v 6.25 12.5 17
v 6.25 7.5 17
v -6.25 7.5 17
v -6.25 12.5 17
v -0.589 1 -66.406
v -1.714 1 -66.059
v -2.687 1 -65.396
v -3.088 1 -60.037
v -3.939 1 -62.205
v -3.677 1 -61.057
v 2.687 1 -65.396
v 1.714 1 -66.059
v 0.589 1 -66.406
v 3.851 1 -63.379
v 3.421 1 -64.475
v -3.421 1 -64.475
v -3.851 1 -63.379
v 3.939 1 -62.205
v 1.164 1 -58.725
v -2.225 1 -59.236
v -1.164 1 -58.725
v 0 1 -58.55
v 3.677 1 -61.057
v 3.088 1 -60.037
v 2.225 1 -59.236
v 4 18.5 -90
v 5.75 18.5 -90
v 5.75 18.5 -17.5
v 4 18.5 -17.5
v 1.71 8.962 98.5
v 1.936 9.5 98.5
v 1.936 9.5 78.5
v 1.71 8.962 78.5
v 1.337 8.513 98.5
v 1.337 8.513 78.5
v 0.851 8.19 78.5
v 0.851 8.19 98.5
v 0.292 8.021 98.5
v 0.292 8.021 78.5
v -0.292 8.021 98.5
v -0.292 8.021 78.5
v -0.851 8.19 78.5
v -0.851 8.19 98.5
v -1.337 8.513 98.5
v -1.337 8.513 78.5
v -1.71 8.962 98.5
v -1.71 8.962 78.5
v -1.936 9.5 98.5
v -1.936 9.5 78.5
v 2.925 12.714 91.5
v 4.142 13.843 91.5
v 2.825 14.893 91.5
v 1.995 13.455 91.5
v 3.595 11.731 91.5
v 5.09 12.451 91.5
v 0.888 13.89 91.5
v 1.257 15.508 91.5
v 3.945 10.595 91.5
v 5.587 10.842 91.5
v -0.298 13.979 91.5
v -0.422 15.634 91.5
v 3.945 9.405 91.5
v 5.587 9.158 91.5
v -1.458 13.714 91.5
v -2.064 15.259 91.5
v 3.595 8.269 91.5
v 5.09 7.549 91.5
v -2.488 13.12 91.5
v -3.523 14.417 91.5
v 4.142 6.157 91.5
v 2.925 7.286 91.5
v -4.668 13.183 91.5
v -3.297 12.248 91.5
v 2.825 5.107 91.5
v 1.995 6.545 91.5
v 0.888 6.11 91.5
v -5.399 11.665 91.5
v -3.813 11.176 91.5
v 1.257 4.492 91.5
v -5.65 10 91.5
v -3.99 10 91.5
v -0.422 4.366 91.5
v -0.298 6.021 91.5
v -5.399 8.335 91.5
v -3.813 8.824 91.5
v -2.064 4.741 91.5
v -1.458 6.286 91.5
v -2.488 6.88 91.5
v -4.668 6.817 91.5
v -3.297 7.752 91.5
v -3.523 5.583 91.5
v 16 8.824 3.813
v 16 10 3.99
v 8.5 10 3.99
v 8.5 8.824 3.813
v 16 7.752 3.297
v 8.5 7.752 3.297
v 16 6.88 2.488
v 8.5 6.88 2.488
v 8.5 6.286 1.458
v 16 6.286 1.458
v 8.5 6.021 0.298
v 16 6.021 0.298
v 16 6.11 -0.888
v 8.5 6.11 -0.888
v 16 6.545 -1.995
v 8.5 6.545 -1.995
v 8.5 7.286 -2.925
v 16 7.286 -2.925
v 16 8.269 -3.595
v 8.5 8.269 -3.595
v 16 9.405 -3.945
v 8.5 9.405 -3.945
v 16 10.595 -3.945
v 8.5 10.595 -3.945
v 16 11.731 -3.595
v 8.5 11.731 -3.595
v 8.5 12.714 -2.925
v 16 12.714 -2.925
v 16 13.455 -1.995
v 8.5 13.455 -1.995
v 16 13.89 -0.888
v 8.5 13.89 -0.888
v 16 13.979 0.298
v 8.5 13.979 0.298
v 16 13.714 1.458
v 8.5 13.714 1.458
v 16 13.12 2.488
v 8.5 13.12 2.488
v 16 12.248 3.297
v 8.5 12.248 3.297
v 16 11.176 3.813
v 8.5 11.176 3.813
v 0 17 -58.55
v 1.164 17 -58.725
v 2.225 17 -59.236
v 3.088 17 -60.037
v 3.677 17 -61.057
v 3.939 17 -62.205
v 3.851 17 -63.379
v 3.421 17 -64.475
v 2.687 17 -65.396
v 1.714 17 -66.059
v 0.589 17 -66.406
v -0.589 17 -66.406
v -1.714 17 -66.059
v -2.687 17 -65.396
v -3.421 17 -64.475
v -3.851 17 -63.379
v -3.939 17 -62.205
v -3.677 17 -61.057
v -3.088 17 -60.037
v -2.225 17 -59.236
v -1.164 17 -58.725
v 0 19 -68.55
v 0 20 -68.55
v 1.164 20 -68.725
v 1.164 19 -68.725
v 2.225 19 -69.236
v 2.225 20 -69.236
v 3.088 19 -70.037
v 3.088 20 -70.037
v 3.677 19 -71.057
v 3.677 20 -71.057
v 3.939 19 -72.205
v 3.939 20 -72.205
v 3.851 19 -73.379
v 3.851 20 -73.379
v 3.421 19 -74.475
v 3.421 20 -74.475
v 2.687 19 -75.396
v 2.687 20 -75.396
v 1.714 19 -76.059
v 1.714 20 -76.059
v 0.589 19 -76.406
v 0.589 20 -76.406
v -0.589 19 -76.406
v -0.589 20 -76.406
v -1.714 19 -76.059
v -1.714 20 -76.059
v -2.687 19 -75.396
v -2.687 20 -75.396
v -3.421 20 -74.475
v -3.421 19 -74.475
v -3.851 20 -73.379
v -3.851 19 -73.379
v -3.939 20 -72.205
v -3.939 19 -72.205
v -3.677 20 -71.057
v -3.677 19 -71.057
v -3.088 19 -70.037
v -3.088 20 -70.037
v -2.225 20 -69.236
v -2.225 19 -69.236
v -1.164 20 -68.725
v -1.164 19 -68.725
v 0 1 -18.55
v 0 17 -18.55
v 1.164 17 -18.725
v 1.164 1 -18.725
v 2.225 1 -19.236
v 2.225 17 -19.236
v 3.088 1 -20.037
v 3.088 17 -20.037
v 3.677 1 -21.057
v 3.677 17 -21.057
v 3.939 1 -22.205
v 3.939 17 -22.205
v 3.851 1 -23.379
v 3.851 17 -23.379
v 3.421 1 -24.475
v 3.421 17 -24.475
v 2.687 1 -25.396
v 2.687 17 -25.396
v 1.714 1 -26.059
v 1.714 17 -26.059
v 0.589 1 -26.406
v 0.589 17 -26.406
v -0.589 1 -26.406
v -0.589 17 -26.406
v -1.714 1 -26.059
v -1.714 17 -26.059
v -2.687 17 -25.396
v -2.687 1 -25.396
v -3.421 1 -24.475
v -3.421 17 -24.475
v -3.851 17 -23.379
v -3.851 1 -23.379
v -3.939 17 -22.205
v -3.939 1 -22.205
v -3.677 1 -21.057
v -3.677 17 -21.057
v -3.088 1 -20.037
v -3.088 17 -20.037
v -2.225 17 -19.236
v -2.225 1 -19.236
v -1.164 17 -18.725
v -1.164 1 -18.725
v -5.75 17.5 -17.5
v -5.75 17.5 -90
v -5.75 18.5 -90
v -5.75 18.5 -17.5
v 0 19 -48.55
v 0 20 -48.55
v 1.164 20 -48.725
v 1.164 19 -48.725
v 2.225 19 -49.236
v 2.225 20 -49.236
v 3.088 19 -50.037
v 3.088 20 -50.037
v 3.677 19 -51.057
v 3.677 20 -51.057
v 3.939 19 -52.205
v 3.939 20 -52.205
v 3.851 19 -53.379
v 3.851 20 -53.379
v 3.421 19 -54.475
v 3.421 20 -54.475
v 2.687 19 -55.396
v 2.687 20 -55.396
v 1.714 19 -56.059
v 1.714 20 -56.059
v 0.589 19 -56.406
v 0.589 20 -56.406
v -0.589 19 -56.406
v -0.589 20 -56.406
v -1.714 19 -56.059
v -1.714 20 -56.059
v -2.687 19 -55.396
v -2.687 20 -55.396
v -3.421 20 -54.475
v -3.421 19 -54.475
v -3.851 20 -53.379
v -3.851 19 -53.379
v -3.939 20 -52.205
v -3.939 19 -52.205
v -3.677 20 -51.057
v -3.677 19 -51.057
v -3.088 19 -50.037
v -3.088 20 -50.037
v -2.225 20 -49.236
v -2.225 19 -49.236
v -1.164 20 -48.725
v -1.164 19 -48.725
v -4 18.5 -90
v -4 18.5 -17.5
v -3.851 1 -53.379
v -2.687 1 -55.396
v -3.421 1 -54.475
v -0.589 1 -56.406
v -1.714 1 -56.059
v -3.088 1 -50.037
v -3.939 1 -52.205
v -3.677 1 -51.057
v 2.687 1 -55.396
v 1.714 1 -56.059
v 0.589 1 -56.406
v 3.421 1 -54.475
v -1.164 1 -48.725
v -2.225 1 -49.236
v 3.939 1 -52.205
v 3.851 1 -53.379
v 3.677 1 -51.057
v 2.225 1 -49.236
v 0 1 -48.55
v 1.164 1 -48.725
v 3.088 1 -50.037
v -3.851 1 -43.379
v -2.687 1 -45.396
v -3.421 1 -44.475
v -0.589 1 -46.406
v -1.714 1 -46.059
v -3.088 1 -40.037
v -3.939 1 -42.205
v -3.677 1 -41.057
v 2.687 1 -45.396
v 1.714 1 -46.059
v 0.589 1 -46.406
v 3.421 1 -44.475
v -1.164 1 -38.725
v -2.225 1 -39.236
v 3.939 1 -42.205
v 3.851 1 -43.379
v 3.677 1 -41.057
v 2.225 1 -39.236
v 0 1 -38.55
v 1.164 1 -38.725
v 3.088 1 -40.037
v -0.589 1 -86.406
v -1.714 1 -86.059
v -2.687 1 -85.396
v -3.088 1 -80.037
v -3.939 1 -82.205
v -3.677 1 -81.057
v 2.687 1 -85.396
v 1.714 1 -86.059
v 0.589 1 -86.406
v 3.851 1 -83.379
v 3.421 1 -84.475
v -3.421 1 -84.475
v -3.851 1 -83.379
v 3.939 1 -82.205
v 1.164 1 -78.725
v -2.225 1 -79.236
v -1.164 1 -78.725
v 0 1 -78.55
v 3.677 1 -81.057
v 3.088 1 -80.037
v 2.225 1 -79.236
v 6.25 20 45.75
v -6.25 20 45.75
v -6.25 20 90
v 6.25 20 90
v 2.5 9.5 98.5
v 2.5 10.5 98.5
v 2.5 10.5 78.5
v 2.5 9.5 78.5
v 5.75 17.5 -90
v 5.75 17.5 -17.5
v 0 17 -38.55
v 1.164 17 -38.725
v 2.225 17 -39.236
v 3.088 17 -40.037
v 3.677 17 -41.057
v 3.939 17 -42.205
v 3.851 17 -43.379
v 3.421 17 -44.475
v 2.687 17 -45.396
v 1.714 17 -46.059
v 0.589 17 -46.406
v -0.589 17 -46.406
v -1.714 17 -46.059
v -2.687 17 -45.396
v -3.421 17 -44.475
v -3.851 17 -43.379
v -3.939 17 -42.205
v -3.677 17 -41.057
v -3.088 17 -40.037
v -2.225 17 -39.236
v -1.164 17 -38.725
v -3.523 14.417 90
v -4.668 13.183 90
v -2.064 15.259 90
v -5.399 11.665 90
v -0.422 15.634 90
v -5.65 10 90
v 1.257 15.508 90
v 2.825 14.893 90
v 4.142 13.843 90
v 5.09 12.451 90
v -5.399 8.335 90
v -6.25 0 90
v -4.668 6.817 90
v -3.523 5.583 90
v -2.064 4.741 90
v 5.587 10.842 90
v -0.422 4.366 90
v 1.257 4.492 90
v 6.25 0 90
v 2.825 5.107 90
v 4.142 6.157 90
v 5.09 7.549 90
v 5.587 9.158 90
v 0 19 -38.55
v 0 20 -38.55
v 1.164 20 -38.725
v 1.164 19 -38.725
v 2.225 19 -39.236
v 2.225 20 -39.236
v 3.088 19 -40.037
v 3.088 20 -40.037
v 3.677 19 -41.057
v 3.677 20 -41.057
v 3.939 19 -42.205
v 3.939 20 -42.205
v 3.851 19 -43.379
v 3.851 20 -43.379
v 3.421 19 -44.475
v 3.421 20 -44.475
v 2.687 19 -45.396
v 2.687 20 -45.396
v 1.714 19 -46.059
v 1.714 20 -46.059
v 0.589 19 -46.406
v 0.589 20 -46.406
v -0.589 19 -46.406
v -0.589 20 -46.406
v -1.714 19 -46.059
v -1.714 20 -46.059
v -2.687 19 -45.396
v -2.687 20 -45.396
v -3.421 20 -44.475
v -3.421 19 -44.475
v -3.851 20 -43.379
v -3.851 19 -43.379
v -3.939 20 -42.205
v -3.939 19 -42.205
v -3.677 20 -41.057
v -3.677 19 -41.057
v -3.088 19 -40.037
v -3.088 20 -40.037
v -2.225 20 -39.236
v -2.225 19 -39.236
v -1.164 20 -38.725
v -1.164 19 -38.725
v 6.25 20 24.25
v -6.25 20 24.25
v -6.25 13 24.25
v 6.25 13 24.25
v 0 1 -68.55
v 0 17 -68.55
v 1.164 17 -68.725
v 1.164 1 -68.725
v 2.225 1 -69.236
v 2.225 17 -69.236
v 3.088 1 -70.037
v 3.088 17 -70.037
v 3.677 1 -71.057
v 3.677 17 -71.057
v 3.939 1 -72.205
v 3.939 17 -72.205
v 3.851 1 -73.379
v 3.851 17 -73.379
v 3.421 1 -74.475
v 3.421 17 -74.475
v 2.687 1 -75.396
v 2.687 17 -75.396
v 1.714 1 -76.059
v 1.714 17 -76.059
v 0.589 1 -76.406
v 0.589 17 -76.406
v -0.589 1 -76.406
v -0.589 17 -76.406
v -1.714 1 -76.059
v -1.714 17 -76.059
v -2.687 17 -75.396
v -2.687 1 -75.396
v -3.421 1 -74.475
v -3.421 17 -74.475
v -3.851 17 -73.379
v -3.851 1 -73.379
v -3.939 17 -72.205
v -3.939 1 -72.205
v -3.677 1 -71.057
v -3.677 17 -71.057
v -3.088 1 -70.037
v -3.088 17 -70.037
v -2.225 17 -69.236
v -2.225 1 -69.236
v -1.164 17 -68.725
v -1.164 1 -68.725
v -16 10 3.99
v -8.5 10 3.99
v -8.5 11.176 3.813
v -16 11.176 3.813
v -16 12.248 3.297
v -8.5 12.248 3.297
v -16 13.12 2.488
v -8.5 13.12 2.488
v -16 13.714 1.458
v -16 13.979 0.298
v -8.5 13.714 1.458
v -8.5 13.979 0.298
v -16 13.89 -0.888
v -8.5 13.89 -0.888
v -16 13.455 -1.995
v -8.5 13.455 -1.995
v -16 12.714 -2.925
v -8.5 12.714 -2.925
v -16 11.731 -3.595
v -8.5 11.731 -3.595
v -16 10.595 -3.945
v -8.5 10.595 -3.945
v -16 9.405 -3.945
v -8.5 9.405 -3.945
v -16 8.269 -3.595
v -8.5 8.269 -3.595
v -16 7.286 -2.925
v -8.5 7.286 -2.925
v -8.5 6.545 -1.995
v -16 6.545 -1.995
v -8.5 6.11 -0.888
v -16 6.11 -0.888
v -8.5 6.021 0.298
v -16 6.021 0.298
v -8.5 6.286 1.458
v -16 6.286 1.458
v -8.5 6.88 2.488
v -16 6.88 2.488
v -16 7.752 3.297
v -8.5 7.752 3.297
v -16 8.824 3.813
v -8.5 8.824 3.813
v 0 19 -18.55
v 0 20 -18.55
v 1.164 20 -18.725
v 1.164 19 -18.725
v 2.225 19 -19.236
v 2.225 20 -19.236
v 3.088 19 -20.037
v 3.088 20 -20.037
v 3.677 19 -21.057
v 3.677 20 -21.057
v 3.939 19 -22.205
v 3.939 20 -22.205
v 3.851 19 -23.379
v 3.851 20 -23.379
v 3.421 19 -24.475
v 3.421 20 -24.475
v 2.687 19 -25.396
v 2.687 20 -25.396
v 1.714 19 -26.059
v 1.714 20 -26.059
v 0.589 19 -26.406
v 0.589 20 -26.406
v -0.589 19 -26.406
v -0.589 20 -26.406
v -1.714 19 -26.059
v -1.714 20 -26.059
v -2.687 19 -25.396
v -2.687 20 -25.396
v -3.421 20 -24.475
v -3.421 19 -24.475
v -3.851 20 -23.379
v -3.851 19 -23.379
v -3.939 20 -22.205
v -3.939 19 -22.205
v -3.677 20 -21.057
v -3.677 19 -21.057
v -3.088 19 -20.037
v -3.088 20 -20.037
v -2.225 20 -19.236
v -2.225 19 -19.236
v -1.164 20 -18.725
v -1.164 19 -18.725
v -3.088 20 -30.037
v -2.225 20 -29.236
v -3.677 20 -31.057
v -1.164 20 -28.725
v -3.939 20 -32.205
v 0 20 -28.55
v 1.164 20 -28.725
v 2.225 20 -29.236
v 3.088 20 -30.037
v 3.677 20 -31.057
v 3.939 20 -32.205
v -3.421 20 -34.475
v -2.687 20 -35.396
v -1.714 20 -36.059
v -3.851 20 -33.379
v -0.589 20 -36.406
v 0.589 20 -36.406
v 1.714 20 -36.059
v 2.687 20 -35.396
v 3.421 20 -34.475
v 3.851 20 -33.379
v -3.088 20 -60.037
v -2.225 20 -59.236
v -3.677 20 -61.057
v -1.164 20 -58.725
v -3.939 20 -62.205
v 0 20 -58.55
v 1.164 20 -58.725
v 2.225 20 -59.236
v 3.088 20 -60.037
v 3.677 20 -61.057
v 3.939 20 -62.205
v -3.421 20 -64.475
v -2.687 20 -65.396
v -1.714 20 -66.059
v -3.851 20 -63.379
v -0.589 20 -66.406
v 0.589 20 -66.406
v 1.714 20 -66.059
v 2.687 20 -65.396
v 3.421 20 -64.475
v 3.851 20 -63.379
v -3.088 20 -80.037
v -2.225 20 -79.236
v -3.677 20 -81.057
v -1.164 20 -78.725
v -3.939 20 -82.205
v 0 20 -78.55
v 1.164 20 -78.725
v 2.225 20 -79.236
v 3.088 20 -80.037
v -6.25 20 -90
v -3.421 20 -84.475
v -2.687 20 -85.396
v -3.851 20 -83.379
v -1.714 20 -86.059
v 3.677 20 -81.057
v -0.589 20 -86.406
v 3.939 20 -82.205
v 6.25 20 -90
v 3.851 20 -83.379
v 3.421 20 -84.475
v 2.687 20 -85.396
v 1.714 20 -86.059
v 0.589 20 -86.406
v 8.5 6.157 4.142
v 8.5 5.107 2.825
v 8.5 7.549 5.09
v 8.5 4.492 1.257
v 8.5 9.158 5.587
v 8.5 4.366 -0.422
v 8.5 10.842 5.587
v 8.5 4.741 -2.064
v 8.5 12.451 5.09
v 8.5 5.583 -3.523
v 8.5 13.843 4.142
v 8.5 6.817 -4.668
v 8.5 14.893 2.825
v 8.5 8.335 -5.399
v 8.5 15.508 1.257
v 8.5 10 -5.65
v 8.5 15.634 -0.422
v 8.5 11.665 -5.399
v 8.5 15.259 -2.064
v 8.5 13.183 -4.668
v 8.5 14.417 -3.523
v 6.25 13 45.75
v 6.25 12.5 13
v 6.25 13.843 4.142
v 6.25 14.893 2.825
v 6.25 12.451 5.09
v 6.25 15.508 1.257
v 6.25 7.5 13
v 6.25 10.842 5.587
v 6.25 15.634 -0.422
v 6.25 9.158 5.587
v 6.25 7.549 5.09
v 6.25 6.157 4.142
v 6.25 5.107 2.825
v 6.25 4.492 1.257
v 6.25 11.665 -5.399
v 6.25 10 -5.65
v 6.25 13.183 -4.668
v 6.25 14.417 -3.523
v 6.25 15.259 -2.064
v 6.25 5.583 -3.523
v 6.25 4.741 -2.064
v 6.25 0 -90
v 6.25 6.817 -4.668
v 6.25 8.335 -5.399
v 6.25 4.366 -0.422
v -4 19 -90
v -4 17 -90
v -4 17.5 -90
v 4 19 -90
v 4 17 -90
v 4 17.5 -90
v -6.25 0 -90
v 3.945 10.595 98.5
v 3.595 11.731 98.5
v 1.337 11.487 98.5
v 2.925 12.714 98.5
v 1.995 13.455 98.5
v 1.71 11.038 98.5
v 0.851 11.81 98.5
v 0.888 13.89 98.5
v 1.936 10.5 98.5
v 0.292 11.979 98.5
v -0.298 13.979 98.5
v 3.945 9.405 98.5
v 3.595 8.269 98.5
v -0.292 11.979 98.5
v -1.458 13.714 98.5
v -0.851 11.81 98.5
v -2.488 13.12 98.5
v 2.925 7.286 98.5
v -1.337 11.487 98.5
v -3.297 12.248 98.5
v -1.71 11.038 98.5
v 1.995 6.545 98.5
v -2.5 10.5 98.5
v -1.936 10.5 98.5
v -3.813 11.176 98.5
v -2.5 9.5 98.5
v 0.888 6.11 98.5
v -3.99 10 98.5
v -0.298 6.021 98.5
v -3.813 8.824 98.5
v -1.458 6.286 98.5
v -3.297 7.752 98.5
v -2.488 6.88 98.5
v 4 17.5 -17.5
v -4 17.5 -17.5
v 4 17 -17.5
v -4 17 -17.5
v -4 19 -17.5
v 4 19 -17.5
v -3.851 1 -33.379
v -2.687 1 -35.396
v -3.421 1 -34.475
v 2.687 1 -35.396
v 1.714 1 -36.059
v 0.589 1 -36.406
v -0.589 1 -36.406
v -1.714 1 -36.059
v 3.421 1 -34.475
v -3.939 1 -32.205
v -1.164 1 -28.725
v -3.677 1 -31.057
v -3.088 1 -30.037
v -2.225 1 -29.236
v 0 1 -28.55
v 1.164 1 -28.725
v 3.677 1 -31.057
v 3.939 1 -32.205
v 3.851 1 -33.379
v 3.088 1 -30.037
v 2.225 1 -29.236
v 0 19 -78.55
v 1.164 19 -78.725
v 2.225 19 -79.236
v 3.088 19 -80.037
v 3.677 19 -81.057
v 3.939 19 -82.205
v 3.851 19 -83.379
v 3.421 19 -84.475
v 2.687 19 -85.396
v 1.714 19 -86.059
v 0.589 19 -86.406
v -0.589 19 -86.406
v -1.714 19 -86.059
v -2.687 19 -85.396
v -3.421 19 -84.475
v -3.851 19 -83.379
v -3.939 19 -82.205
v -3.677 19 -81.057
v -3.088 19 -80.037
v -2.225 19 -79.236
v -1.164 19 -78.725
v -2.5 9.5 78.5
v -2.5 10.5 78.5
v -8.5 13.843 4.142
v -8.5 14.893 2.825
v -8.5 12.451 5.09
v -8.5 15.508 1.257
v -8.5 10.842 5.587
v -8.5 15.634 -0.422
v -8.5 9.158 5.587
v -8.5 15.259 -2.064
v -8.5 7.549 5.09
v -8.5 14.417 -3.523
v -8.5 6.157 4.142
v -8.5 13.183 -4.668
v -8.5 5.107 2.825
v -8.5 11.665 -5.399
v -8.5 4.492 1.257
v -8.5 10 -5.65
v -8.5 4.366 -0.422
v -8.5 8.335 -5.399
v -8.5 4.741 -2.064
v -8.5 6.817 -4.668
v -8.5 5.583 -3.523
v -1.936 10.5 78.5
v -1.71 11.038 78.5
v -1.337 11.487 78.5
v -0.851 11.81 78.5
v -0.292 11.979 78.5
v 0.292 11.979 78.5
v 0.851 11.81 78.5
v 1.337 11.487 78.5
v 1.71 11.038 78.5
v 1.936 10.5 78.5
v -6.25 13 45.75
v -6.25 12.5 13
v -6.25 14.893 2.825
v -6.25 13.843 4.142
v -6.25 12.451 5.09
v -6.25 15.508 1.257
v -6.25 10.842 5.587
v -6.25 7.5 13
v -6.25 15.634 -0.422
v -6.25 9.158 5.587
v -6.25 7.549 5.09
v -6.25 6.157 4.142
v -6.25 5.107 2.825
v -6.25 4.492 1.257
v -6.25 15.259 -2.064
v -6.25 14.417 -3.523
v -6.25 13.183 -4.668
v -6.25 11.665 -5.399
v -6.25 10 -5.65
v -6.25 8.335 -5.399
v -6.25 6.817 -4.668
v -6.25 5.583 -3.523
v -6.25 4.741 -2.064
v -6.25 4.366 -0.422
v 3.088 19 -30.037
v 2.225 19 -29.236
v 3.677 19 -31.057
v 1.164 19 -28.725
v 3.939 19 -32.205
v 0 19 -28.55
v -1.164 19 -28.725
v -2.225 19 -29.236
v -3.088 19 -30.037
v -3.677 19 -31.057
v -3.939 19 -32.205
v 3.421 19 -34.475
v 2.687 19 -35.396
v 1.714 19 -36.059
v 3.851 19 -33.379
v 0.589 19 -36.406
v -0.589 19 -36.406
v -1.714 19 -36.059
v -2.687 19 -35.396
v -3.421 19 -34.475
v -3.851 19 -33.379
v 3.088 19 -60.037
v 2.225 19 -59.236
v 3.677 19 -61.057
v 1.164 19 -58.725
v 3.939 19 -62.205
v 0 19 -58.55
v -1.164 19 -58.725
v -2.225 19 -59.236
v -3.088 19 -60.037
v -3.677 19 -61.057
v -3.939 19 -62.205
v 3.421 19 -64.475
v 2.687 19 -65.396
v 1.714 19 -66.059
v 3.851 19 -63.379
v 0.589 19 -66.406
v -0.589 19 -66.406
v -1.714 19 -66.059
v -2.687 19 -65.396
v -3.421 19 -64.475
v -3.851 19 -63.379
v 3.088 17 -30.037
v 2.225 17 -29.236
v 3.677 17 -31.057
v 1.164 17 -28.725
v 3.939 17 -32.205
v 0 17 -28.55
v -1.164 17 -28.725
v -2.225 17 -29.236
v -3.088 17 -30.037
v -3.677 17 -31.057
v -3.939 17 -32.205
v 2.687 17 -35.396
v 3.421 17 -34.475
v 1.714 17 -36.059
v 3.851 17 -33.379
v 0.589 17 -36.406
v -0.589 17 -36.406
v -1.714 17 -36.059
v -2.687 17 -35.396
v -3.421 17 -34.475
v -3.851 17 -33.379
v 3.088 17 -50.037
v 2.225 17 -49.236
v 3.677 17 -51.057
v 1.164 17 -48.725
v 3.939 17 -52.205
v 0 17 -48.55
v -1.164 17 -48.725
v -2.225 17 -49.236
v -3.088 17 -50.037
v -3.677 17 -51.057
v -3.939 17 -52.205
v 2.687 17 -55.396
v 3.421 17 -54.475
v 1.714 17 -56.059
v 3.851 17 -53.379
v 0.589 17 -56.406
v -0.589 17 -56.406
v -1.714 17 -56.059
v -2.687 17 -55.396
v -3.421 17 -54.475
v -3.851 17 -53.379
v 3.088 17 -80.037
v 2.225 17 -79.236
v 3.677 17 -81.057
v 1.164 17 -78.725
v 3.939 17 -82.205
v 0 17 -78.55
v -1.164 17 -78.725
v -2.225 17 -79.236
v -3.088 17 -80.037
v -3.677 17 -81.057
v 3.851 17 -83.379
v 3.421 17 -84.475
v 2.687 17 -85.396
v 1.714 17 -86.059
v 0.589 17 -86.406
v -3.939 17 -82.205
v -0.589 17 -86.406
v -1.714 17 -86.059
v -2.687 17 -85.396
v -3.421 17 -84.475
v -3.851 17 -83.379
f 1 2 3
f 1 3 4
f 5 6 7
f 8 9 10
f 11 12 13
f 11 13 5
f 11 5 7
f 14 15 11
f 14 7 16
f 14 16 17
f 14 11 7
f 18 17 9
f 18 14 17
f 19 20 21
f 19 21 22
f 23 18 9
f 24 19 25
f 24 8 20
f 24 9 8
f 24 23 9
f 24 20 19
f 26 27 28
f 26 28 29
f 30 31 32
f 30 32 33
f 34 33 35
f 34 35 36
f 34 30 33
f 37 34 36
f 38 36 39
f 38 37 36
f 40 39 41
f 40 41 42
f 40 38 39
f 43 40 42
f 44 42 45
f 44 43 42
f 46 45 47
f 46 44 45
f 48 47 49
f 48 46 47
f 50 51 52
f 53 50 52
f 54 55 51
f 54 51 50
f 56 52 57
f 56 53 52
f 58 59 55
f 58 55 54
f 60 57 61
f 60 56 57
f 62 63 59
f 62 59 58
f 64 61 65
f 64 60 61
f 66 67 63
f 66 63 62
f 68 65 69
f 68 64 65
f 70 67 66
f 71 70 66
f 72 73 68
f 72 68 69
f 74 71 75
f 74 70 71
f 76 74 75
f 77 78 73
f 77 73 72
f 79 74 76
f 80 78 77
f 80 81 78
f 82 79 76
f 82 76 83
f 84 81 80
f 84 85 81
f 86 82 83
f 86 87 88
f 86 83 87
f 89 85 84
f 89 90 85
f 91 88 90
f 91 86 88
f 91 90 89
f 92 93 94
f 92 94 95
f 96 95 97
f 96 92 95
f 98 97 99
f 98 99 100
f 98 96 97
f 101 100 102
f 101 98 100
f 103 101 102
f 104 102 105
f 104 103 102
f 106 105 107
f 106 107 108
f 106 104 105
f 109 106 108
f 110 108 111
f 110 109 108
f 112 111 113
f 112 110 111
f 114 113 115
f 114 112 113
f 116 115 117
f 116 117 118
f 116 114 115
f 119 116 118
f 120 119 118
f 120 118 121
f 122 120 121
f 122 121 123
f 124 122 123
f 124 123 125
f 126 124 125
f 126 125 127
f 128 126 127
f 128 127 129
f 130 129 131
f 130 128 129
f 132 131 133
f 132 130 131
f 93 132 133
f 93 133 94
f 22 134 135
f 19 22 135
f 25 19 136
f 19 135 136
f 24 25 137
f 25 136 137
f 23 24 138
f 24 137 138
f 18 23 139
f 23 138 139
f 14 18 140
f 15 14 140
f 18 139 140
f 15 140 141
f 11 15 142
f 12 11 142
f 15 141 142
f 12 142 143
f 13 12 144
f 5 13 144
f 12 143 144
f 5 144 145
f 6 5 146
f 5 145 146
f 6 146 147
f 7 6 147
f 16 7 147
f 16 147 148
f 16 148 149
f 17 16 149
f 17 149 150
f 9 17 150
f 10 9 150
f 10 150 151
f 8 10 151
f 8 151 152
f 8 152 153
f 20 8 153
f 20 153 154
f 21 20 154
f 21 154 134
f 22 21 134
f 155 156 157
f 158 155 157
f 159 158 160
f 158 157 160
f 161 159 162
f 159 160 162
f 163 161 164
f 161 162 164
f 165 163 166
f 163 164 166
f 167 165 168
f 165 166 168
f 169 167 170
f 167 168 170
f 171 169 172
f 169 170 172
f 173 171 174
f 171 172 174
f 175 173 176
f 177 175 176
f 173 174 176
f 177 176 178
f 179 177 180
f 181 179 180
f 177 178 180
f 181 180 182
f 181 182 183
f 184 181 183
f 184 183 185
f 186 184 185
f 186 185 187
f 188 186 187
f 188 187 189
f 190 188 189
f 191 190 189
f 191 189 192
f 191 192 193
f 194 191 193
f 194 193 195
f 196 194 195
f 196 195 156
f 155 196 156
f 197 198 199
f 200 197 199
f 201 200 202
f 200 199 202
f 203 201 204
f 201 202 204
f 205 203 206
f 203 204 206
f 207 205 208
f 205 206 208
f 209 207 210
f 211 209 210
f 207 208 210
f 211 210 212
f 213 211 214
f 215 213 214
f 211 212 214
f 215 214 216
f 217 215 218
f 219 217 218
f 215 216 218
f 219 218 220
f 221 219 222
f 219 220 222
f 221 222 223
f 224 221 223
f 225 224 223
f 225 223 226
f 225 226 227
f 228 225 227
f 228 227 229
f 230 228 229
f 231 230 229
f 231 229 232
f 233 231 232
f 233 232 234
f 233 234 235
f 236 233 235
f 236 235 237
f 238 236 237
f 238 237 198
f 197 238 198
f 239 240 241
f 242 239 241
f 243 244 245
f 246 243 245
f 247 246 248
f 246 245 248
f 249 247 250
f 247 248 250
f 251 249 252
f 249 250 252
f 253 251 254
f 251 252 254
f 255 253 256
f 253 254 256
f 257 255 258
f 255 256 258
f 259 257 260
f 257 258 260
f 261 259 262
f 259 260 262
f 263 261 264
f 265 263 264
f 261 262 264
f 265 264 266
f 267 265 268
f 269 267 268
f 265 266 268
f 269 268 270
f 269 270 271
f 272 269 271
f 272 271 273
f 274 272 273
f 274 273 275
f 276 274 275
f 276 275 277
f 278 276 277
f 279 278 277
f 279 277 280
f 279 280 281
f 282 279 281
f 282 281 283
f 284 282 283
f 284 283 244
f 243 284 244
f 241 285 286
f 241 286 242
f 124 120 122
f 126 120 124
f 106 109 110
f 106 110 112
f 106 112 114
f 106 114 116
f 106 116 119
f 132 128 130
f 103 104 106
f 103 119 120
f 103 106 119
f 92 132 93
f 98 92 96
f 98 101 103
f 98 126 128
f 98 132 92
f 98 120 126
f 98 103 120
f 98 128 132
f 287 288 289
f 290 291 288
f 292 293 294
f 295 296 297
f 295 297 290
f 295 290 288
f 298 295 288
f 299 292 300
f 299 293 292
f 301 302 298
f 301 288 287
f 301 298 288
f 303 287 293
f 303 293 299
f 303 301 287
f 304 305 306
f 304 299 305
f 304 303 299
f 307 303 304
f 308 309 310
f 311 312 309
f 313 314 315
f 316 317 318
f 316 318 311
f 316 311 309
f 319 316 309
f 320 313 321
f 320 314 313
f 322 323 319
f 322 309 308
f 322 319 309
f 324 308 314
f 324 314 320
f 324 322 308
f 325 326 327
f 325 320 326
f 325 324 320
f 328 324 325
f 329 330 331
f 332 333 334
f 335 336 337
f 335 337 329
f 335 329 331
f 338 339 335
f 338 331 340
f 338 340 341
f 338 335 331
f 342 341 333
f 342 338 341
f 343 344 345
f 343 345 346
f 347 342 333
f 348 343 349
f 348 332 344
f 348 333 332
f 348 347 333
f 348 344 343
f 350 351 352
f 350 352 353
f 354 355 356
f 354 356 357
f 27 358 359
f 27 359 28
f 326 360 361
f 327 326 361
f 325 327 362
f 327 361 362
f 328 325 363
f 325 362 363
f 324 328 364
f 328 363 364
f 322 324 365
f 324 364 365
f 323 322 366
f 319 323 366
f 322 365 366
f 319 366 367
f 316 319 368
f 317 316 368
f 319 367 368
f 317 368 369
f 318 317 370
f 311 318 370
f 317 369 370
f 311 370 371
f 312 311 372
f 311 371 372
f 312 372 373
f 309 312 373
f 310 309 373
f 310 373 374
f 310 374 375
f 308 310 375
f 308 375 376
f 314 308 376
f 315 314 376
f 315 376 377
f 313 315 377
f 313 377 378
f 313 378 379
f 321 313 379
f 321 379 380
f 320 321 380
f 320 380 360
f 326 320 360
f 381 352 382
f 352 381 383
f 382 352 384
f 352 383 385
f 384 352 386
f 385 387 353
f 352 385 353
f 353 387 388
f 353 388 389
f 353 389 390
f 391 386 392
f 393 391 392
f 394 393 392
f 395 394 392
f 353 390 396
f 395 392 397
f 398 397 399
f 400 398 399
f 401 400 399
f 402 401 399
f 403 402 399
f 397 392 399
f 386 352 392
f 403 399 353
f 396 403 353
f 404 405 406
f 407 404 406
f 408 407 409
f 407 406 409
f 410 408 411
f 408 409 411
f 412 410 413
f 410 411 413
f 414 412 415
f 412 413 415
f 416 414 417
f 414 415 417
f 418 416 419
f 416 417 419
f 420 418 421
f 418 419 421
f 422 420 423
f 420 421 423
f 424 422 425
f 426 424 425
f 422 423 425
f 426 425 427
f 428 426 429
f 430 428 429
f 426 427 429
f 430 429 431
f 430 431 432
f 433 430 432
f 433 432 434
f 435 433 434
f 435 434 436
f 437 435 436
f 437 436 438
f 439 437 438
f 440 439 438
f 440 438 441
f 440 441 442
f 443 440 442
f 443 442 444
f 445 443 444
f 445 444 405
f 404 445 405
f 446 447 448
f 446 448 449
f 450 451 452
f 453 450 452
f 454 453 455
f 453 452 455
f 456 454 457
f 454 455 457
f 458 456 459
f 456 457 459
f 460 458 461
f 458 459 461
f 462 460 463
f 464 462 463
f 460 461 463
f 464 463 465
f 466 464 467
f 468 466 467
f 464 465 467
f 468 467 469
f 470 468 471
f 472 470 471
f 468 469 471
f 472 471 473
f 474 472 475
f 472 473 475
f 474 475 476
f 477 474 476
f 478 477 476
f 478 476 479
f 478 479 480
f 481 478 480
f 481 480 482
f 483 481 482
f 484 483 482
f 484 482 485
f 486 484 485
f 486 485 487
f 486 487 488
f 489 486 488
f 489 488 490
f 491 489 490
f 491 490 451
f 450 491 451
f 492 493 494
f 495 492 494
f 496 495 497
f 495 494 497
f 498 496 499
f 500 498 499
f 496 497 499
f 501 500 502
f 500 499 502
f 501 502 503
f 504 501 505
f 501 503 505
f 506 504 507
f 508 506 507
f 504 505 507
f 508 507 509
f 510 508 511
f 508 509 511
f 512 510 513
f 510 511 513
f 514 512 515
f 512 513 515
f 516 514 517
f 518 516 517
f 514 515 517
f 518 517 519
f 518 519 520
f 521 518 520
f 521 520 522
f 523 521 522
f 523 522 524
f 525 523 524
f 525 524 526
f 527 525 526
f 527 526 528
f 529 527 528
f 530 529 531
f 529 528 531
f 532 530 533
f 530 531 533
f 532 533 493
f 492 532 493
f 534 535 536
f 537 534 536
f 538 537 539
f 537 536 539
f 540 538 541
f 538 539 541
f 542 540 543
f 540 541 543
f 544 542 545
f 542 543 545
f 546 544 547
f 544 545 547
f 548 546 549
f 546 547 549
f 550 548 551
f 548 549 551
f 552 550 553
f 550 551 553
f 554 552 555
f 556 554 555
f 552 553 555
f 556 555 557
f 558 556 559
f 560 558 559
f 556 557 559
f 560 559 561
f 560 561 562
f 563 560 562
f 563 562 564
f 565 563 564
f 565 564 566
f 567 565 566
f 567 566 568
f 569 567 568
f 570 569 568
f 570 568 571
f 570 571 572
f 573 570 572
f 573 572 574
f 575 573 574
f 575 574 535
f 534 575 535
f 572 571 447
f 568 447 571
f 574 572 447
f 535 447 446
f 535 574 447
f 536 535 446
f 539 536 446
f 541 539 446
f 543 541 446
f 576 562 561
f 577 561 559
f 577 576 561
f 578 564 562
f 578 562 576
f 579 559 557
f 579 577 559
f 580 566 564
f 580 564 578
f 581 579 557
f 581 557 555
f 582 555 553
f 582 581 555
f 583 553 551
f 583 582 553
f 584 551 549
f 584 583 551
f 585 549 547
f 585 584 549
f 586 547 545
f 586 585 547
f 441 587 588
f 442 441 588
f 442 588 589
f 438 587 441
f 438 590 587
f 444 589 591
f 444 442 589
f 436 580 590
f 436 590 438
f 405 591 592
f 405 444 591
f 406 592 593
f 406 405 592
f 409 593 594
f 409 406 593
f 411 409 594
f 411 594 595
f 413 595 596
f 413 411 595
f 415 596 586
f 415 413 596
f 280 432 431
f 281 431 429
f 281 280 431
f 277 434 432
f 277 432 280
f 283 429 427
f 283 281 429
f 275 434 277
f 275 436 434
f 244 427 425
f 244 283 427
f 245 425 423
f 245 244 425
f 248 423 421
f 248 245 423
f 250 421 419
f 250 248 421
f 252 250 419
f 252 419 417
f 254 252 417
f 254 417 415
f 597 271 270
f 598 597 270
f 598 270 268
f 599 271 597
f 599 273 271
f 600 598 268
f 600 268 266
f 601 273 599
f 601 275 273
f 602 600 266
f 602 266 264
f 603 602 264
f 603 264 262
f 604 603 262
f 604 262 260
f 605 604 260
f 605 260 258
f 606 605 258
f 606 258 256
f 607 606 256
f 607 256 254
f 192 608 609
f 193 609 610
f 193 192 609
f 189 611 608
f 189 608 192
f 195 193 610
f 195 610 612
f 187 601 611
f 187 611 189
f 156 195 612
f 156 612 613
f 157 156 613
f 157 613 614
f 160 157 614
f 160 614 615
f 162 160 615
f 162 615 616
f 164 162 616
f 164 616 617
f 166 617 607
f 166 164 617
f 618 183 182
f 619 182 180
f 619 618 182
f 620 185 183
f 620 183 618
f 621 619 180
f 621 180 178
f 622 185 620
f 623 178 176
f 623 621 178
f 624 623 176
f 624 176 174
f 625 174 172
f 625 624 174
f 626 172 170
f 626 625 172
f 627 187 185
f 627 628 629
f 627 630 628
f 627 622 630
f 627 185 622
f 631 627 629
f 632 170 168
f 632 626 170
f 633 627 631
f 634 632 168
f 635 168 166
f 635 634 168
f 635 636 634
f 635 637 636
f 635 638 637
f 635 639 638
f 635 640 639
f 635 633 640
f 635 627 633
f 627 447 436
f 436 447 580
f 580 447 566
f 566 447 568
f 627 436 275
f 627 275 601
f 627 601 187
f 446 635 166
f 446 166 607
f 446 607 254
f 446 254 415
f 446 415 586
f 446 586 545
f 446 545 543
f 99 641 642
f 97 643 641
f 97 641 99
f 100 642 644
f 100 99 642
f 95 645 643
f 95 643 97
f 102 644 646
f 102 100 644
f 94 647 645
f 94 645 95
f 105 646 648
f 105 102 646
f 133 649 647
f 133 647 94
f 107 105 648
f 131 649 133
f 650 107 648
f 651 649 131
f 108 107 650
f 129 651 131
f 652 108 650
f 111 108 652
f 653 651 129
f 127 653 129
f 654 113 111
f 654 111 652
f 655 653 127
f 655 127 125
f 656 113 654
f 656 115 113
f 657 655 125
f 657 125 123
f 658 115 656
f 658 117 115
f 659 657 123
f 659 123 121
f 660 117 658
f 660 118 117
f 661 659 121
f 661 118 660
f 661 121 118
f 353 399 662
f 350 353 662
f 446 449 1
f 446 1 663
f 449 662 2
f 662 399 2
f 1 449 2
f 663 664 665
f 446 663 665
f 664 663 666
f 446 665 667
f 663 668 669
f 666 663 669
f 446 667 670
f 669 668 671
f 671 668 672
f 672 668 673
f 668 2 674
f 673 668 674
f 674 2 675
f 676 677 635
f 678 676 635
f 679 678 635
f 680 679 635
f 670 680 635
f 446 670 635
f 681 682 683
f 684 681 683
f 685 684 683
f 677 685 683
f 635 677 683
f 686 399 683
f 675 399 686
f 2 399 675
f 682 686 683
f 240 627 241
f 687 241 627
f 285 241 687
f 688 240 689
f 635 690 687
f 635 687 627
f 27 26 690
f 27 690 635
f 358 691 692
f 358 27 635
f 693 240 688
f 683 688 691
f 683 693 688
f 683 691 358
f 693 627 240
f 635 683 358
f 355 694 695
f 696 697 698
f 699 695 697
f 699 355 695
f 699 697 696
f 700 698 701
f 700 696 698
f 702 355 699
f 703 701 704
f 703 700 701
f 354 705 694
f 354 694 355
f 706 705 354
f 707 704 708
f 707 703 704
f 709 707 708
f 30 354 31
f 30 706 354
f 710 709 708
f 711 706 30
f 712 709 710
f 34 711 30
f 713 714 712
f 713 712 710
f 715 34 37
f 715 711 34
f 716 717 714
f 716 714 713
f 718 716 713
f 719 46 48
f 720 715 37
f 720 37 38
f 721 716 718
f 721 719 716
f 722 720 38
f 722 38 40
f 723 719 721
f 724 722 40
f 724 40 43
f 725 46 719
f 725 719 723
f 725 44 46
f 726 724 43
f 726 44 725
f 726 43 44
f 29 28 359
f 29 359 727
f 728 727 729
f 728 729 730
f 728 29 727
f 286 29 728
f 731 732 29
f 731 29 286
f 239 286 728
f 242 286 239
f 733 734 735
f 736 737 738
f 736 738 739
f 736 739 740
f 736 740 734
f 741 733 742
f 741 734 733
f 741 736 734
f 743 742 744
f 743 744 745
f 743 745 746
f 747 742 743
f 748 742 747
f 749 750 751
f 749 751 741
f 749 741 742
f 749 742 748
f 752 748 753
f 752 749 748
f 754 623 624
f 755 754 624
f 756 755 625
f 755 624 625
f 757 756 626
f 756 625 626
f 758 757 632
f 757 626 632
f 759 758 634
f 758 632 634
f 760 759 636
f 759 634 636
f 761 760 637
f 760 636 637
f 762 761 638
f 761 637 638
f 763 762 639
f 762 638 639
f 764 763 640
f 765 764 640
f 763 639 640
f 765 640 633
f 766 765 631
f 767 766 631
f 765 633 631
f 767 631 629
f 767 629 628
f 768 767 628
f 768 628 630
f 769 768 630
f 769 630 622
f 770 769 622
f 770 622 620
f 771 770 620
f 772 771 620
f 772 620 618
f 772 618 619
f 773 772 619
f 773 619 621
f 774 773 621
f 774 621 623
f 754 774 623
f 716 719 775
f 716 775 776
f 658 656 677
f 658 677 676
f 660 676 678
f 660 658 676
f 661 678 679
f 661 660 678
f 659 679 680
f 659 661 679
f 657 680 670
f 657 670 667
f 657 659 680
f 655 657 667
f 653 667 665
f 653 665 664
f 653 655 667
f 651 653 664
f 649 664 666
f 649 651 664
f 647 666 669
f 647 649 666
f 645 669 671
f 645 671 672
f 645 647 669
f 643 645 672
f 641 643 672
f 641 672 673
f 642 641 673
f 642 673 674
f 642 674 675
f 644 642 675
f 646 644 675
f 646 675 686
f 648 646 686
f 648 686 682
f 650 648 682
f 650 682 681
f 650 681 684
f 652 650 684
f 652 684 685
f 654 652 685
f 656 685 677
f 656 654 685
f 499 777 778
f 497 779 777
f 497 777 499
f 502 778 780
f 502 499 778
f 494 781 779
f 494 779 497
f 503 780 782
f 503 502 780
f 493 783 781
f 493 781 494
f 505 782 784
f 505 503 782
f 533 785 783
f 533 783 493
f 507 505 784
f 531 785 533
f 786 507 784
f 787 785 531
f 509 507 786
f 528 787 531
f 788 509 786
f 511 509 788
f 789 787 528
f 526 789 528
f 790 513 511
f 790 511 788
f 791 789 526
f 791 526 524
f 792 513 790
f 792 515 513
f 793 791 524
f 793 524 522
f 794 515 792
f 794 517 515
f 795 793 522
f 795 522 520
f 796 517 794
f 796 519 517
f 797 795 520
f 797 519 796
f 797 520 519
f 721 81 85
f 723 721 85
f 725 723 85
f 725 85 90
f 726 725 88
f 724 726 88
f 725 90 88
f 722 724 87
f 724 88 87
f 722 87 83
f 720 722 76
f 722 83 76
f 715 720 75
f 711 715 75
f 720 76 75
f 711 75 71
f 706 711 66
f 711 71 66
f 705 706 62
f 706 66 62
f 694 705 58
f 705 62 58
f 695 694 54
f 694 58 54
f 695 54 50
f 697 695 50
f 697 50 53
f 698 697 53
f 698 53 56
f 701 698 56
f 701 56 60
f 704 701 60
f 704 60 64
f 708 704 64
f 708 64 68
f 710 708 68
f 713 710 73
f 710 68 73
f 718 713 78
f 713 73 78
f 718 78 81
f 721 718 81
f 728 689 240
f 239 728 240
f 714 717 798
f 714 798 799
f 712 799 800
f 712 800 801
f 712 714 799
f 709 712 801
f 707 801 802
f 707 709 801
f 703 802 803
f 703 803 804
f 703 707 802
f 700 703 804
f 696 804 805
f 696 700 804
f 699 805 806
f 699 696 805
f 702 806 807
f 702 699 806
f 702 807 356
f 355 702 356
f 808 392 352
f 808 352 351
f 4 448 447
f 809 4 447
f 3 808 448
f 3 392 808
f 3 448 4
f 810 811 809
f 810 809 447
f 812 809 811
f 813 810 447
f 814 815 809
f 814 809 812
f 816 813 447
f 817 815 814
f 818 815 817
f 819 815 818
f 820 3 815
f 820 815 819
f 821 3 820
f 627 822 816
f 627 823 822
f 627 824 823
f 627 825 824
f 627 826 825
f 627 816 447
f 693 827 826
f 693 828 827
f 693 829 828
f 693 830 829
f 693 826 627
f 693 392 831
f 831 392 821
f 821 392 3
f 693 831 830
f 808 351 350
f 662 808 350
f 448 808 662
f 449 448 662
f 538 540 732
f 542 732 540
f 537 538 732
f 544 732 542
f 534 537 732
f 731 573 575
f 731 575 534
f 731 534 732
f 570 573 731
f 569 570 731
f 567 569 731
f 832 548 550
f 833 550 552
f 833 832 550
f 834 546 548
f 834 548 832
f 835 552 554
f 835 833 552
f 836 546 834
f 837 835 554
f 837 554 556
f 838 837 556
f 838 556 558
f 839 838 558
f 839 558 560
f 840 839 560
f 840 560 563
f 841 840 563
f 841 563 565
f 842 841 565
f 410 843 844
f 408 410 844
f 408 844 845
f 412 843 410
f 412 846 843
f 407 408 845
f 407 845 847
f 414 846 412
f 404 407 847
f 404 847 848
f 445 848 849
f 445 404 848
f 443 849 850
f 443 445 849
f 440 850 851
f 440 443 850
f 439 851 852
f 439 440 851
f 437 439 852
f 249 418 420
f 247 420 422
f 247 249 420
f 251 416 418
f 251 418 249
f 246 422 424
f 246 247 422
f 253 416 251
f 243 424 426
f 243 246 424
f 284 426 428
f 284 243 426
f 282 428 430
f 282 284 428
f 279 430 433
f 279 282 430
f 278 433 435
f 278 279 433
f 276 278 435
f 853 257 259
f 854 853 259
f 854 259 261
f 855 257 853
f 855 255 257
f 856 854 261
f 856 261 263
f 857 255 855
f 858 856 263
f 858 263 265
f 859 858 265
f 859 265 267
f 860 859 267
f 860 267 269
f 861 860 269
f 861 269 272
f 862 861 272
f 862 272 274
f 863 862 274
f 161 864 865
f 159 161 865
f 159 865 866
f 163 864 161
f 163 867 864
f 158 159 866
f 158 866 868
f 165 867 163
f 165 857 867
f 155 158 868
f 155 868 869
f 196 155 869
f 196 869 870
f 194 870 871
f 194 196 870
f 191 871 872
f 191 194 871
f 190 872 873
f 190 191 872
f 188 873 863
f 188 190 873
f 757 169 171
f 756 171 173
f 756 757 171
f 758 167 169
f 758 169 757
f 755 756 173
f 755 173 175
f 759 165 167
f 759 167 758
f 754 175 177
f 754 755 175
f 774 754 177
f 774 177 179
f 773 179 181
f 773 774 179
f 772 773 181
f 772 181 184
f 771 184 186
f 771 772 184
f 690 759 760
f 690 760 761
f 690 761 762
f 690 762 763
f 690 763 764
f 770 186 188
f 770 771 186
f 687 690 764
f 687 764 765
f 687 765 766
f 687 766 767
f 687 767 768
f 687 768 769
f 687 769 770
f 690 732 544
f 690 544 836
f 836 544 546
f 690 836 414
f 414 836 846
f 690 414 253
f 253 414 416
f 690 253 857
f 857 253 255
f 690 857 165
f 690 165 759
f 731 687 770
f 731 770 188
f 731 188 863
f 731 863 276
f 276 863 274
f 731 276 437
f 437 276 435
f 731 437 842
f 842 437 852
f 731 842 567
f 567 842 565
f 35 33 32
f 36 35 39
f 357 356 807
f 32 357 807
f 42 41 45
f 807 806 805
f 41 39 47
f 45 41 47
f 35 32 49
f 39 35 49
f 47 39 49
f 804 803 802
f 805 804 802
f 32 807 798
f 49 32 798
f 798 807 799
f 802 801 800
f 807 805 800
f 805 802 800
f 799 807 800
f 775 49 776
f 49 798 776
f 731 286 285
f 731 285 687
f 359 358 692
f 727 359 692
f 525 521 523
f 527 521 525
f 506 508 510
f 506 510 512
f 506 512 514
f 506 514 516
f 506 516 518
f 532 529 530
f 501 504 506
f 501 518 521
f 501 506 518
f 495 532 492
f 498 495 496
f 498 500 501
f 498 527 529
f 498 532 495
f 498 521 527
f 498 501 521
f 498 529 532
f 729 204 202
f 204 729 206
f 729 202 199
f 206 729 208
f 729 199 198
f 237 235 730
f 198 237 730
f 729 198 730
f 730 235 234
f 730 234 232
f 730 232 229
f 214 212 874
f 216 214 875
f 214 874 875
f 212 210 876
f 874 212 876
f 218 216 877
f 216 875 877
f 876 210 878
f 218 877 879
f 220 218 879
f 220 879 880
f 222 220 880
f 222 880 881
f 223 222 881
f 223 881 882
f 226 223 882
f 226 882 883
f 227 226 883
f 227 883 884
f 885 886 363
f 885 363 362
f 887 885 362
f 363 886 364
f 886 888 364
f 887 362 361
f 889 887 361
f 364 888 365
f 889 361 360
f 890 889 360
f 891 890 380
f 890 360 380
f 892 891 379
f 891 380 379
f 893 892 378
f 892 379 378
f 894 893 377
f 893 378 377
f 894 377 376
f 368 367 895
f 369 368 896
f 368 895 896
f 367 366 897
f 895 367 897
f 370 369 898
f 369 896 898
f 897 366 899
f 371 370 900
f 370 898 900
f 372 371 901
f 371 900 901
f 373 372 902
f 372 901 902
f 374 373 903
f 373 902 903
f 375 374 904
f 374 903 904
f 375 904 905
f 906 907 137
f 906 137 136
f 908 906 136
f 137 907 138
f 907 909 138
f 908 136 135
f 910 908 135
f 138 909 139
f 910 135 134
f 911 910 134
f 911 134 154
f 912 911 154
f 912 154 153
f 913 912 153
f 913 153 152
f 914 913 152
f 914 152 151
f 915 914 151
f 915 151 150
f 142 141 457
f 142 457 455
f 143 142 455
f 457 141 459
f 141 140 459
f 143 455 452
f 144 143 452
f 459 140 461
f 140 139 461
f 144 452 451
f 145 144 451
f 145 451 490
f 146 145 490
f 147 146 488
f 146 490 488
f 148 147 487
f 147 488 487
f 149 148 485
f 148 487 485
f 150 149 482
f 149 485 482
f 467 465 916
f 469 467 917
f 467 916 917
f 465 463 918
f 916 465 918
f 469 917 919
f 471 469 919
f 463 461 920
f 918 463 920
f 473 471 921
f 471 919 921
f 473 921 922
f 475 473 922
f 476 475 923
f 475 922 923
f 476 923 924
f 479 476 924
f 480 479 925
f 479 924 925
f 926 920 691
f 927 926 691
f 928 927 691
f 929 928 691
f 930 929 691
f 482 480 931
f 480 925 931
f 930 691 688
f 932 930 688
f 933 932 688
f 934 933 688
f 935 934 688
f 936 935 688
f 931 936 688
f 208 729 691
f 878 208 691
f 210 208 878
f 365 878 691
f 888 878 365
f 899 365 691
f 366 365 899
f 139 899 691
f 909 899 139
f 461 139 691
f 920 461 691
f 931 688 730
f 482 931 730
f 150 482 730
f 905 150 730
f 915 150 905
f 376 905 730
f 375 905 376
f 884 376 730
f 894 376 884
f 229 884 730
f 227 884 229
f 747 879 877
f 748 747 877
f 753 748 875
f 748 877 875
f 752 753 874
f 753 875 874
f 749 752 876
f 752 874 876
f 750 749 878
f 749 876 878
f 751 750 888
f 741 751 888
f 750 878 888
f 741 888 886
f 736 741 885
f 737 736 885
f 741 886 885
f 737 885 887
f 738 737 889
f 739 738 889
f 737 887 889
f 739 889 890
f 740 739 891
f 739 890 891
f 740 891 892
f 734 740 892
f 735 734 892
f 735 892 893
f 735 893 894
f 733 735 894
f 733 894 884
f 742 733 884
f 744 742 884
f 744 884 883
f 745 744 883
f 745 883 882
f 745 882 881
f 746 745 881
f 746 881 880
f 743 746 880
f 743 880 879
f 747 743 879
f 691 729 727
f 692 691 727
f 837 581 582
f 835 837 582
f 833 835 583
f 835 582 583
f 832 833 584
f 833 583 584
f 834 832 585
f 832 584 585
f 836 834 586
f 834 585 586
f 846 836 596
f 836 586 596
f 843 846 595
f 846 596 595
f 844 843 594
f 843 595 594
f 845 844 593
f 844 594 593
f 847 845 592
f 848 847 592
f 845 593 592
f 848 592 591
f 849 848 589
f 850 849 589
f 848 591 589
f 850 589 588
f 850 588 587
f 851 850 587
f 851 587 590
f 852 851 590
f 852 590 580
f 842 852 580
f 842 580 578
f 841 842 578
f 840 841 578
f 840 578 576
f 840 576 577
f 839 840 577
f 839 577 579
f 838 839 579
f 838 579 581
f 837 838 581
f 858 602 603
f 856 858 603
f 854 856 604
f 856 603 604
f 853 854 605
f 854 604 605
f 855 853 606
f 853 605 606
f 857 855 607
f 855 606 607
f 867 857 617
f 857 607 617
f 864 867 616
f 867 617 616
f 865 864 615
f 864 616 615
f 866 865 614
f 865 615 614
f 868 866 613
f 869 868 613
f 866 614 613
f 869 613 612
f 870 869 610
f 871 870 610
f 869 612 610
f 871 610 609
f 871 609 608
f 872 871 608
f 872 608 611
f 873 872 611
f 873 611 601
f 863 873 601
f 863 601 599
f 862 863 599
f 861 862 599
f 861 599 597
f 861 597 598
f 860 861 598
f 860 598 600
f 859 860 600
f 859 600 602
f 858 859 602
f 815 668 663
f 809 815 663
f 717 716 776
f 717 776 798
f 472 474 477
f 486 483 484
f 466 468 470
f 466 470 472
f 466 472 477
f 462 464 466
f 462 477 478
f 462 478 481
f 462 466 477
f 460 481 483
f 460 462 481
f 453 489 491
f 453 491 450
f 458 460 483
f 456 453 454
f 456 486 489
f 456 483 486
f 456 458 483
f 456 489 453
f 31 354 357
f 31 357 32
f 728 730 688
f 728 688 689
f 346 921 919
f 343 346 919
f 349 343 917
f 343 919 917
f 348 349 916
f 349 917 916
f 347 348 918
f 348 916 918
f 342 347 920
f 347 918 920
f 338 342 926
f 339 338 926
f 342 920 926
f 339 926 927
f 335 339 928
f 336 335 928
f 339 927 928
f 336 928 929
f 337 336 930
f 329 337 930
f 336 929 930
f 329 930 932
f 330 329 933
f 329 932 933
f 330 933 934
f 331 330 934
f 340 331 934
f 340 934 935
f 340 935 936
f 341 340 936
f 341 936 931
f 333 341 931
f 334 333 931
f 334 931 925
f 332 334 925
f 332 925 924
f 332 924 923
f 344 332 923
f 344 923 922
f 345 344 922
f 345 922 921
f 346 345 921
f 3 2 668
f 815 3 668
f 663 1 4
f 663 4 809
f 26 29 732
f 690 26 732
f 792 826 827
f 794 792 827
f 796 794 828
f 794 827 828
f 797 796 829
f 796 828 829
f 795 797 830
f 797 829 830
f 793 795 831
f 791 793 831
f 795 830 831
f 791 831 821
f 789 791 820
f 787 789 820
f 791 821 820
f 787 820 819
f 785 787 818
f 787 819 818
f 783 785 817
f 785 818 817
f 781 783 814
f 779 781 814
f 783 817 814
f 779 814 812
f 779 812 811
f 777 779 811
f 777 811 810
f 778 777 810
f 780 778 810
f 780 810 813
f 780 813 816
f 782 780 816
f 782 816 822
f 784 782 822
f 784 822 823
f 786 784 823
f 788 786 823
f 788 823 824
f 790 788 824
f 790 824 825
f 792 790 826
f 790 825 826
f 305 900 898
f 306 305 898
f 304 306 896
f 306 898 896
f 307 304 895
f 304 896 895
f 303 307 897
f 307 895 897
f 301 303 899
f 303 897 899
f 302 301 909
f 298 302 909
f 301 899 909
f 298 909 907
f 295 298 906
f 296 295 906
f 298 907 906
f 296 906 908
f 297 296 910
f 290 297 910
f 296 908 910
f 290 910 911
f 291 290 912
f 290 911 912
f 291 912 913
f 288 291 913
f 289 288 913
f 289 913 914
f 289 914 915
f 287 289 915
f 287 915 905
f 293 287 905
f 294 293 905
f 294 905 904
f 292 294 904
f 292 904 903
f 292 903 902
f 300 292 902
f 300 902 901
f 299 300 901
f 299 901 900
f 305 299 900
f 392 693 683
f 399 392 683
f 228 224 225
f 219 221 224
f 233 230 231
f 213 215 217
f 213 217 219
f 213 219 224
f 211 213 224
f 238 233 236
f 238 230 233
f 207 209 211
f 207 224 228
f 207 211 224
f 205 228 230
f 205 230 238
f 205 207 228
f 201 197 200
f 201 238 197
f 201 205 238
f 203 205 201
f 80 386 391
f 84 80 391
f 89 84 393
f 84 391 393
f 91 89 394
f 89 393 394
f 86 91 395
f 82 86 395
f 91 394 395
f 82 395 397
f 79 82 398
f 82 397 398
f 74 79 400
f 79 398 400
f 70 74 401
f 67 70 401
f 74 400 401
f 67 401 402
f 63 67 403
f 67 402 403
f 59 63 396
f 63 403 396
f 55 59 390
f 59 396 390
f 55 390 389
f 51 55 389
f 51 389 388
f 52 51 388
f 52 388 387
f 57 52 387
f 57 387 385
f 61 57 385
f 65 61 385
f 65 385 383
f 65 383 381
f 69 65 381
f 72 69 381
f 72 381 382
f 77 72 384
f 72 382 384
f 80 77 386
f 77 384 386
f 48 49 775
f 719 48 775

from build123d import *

# Parameters (mm, degrees)
SKETCH1_W           = 12.5
SKETCH1_H           = 180
BOSS_EXTRUDE1_DEPTH = 20
SKETCH2_R           = 5.65
BOSS_EXTRUDE2_DEPTH = 1.5
SKETCH3_R           = 3.99
BOSS_EXTRUDE3_DEPTH = 7
SKETCH4_R           = 5.65
BOSS_EXTRUDE4_DEPTH = 2.25
SKETCH5_R           = 3.99
BOSS_EXTRUDE5_DEPTH = 7.5
BOSS_EXTRUDE6_START = 2.25
SKETCH6_R           = 5.65
BOSS_EXTRUDE6_DEPTH = 2.25
BOSS_EXTRUDE7_START = 7.5
SKETCH7_R           = 3.99
BOSS_EXTRUDE7_DEPTH = 7.5
SKETCH8_R           = 3.95
CUT_EXTRUDE1_DEPTH  = 19
SKETCH9_W           = 8
SKETCH9_H           = 2
CUT_EXTRUDE2_DEPTH  = 72.5
SKETCH10_W          = 11.5
SKETCH10_H          = 1
CUT_EXTRUDE3_DEPTH  = 72.5
SKETCH11_W          = 12.5
SKETCH11_H          = 21.5
CUT_EXTRUDE4_DEPTH  = 7
CUT_EXTRUDE5_DEPTH  = 20
SKETCH14_W          = 4
SKETCH14_H          = 5
CUT_EXTRUDE6_DEPTH  = 12.5


with BuildPart() as part:
    # Sketch1 → Boss-Extrude1 (new body)
    with BuildSketch(Plane(origin=(0, 0, 0), x_dir=(1, 0, 0), z_dir=(0, 1, 0))):
        Rectangle(SKETCH1_W, SKETCH1_H)
    extrude(amount=BOSS_EXTRUDE1_DEPTH)

    # Sketch2 → Boss-Extrude2 (add)
    with BuildSketch(Plane.XY.offset(90)):
        with Locations(Location((0, 10, 0), (0, 0, 180))):
            Circle(SKETCH2_R)
    extrude(amount=BOSS_EXTRUDE2_DEPTH)

    # Sketch3 → Boss-Extrude3 (add)
    with BuildSketch(Plane.XY.offset(91.5)):
        with Locations(Location((0, 10, 0), (0, 0, 180))):
            Circle(SKETCH3_R)
    extrude(amount=BOSS_EXTRUDE3_DEPTH)

    # Sketch4 → Boss-Extrude4 (add)
    with BuildSketch(Plane.ZY.offset(6.25)):
        with Locations(Location((0, 10, 0), (0, 0, 180))):
            Circle(SKETCH4_R)
    extrude(amount=BOSS_EXTRUDE4_DEPTH)

    # Sketch5 → Boss-Extrude5 (add)
    with BuildSketch(Plane.ZY.offset(8.5)):
        with Locations((0, 10)):
            Circle(SKETCH5_R)
    extrude(amount=BOSS_EXTRUDE5_DEPTH)

    # Sketch6 → Boss-Extrude6 (add)
    with BuildSketch(Plane(origin=(6.25, 0, 0), x_dir=(0, 0, -1), z_dir=(1, 0, 0)).offset(BOSS_EXTRUDE6_START)):
        with Locations((0, 10)):
            Circle(SKETCH6_R)
    extrude(amount=-BOSS_EXTRUDE6_DEPTH)

    # Sketch7 → Boss-Extrude7 (add)
    with BuildSketch(Plane(origin=(8.5, 0, 0), x_dir=(0, 0, -1), z_dir=(1, 0, 0)).offset(BOSS_EXTRUDE7_START)):
        with Locations(Location((0, 10, 0), (0, 0, 180))):
            Circle(SKETCH7_R)
    extrude(amount=-BOSS_EXTRUDE7_DEPTH)

    # Sketch8 → Cut-Extrude1 (cut)
    with BuildSketch(Plane(origin=(0, 20, 0), x_dir=(1, 0, 0), z_dir=(0, 1, 0))):
        with Locations(Location((0, 82.5, 0), (0, 0, 270))):
            Circle(SKETCH8_R)
        with Locations(Location((0, 72.5, 0), (0, 0, 270))):
            Circle(SKETCH8_R)
        with Locations(Location((0, 62.5, 0), (0, 0, 270))):
            Circle(SKETCH8_R)
        with Locations(Location((0, 52.5, 0), (0, 0, 270))):
            Circle(SKETCH8_R)
        with Locations(Location((0, 42.5, 0), (0, 0, 270))):
            Circle(SKETCH8_R)
        with Locations(Location((0, 32.5, 0), (0, 0, 270))):
            Circle(SKETCH8_R)
        with Locations(Location((0, 22.5, 0), (0, 0, 270))):
            Circle(SKETCH8_R)
    extrude(amount=-CUT_EXTRUDE1_DEPTH, mode=Mode.SUBTRACT)

    # Sketch9 → Cut-Extrude2 (cut)
    with BuildSketch(Plane(origin=(0, 0, -90), x_dir=(-1, 0, 0), z_dir=(0, 0, -1))):
        with Locations((0, 18)):
            Rectangle(SKETCH9_W, SKETCH9_H)
    extrude(amount=-CUT_EXTRUDE2_DEPTH, mode=Mode.SUBTRACT)

    # Sketch10 → Cut-Extrude3 (cut)
    with BuildSketch(Plane(origin=(0, 0, -90), x_dir=(-1, 0, 0), z_dir=(0, 0, -1))):
        with Locations((0, 18)):
            Rectangle(SKETCH10_W, SKETCH10_H)
    extrude(amount=-CUT_EXTRUDE3_DEPTH, mode=Mode.SUBTRACT)

    # Sketch11 → Cut-Extrude4 (cut)
    with BuildSketch(Plane(origin=(0, 20, 0), x_dir=(1, 0, 0), z_dir=(0, 1, 0))):
        with Locations((0, -35)):
            Rectangle(SKETCH11_W, SKETCH11_H)
    extrude(amount=-CUT_EXTRUDE4_DEPTH, mode=Mode.SUBTRACT)

    # Sketch12 → Cut-Extrude5 (cut)
    with BuildSketch(Plane.XY.offset(98.5)):
        with BuildLine():
            Line((1.936491673, 10.5), (2.5, 10.5))
            Line((2.5, 10.5), (2.5, 9.5))
            Line((2.5, 9.5), (1.936491673, 9.5))
            ThreePointArc((1.936491673, 9.5), (0, 8), (-1.936491673, 9.5))
            Line((-1.936491673, 9.5), (-2.5, 9.5))
            Line((-2.5, 9.5), (-2.5, 10.5))
            Line((-2.5, 10.5), (-1.936491673, 10.5))
            ThreePointArc((-1.936491673, 10.5), (0, 12), (1.936491673, 10.5))
        make_face()
    extrude(amount=-CUT_EXTRUDE5_DEPTH, mode=Mode.SUBTRACT)

    # Sketch14 → Cut-Extrude6 (cut)
    with BuildSketch(Plane(origin=(6.25, 0, 0), x_dir=(0, 0, -1), z_dir=(1, 0, 0))):
        with Locations((-15, 10)):
            Rectangle(SKETCH14_W, SKETCH14_H)
    extrude(amount=-CUT_EXTRUDE6_DEPTH, mode=Mode.SUBTRACT)


solid = part.part
